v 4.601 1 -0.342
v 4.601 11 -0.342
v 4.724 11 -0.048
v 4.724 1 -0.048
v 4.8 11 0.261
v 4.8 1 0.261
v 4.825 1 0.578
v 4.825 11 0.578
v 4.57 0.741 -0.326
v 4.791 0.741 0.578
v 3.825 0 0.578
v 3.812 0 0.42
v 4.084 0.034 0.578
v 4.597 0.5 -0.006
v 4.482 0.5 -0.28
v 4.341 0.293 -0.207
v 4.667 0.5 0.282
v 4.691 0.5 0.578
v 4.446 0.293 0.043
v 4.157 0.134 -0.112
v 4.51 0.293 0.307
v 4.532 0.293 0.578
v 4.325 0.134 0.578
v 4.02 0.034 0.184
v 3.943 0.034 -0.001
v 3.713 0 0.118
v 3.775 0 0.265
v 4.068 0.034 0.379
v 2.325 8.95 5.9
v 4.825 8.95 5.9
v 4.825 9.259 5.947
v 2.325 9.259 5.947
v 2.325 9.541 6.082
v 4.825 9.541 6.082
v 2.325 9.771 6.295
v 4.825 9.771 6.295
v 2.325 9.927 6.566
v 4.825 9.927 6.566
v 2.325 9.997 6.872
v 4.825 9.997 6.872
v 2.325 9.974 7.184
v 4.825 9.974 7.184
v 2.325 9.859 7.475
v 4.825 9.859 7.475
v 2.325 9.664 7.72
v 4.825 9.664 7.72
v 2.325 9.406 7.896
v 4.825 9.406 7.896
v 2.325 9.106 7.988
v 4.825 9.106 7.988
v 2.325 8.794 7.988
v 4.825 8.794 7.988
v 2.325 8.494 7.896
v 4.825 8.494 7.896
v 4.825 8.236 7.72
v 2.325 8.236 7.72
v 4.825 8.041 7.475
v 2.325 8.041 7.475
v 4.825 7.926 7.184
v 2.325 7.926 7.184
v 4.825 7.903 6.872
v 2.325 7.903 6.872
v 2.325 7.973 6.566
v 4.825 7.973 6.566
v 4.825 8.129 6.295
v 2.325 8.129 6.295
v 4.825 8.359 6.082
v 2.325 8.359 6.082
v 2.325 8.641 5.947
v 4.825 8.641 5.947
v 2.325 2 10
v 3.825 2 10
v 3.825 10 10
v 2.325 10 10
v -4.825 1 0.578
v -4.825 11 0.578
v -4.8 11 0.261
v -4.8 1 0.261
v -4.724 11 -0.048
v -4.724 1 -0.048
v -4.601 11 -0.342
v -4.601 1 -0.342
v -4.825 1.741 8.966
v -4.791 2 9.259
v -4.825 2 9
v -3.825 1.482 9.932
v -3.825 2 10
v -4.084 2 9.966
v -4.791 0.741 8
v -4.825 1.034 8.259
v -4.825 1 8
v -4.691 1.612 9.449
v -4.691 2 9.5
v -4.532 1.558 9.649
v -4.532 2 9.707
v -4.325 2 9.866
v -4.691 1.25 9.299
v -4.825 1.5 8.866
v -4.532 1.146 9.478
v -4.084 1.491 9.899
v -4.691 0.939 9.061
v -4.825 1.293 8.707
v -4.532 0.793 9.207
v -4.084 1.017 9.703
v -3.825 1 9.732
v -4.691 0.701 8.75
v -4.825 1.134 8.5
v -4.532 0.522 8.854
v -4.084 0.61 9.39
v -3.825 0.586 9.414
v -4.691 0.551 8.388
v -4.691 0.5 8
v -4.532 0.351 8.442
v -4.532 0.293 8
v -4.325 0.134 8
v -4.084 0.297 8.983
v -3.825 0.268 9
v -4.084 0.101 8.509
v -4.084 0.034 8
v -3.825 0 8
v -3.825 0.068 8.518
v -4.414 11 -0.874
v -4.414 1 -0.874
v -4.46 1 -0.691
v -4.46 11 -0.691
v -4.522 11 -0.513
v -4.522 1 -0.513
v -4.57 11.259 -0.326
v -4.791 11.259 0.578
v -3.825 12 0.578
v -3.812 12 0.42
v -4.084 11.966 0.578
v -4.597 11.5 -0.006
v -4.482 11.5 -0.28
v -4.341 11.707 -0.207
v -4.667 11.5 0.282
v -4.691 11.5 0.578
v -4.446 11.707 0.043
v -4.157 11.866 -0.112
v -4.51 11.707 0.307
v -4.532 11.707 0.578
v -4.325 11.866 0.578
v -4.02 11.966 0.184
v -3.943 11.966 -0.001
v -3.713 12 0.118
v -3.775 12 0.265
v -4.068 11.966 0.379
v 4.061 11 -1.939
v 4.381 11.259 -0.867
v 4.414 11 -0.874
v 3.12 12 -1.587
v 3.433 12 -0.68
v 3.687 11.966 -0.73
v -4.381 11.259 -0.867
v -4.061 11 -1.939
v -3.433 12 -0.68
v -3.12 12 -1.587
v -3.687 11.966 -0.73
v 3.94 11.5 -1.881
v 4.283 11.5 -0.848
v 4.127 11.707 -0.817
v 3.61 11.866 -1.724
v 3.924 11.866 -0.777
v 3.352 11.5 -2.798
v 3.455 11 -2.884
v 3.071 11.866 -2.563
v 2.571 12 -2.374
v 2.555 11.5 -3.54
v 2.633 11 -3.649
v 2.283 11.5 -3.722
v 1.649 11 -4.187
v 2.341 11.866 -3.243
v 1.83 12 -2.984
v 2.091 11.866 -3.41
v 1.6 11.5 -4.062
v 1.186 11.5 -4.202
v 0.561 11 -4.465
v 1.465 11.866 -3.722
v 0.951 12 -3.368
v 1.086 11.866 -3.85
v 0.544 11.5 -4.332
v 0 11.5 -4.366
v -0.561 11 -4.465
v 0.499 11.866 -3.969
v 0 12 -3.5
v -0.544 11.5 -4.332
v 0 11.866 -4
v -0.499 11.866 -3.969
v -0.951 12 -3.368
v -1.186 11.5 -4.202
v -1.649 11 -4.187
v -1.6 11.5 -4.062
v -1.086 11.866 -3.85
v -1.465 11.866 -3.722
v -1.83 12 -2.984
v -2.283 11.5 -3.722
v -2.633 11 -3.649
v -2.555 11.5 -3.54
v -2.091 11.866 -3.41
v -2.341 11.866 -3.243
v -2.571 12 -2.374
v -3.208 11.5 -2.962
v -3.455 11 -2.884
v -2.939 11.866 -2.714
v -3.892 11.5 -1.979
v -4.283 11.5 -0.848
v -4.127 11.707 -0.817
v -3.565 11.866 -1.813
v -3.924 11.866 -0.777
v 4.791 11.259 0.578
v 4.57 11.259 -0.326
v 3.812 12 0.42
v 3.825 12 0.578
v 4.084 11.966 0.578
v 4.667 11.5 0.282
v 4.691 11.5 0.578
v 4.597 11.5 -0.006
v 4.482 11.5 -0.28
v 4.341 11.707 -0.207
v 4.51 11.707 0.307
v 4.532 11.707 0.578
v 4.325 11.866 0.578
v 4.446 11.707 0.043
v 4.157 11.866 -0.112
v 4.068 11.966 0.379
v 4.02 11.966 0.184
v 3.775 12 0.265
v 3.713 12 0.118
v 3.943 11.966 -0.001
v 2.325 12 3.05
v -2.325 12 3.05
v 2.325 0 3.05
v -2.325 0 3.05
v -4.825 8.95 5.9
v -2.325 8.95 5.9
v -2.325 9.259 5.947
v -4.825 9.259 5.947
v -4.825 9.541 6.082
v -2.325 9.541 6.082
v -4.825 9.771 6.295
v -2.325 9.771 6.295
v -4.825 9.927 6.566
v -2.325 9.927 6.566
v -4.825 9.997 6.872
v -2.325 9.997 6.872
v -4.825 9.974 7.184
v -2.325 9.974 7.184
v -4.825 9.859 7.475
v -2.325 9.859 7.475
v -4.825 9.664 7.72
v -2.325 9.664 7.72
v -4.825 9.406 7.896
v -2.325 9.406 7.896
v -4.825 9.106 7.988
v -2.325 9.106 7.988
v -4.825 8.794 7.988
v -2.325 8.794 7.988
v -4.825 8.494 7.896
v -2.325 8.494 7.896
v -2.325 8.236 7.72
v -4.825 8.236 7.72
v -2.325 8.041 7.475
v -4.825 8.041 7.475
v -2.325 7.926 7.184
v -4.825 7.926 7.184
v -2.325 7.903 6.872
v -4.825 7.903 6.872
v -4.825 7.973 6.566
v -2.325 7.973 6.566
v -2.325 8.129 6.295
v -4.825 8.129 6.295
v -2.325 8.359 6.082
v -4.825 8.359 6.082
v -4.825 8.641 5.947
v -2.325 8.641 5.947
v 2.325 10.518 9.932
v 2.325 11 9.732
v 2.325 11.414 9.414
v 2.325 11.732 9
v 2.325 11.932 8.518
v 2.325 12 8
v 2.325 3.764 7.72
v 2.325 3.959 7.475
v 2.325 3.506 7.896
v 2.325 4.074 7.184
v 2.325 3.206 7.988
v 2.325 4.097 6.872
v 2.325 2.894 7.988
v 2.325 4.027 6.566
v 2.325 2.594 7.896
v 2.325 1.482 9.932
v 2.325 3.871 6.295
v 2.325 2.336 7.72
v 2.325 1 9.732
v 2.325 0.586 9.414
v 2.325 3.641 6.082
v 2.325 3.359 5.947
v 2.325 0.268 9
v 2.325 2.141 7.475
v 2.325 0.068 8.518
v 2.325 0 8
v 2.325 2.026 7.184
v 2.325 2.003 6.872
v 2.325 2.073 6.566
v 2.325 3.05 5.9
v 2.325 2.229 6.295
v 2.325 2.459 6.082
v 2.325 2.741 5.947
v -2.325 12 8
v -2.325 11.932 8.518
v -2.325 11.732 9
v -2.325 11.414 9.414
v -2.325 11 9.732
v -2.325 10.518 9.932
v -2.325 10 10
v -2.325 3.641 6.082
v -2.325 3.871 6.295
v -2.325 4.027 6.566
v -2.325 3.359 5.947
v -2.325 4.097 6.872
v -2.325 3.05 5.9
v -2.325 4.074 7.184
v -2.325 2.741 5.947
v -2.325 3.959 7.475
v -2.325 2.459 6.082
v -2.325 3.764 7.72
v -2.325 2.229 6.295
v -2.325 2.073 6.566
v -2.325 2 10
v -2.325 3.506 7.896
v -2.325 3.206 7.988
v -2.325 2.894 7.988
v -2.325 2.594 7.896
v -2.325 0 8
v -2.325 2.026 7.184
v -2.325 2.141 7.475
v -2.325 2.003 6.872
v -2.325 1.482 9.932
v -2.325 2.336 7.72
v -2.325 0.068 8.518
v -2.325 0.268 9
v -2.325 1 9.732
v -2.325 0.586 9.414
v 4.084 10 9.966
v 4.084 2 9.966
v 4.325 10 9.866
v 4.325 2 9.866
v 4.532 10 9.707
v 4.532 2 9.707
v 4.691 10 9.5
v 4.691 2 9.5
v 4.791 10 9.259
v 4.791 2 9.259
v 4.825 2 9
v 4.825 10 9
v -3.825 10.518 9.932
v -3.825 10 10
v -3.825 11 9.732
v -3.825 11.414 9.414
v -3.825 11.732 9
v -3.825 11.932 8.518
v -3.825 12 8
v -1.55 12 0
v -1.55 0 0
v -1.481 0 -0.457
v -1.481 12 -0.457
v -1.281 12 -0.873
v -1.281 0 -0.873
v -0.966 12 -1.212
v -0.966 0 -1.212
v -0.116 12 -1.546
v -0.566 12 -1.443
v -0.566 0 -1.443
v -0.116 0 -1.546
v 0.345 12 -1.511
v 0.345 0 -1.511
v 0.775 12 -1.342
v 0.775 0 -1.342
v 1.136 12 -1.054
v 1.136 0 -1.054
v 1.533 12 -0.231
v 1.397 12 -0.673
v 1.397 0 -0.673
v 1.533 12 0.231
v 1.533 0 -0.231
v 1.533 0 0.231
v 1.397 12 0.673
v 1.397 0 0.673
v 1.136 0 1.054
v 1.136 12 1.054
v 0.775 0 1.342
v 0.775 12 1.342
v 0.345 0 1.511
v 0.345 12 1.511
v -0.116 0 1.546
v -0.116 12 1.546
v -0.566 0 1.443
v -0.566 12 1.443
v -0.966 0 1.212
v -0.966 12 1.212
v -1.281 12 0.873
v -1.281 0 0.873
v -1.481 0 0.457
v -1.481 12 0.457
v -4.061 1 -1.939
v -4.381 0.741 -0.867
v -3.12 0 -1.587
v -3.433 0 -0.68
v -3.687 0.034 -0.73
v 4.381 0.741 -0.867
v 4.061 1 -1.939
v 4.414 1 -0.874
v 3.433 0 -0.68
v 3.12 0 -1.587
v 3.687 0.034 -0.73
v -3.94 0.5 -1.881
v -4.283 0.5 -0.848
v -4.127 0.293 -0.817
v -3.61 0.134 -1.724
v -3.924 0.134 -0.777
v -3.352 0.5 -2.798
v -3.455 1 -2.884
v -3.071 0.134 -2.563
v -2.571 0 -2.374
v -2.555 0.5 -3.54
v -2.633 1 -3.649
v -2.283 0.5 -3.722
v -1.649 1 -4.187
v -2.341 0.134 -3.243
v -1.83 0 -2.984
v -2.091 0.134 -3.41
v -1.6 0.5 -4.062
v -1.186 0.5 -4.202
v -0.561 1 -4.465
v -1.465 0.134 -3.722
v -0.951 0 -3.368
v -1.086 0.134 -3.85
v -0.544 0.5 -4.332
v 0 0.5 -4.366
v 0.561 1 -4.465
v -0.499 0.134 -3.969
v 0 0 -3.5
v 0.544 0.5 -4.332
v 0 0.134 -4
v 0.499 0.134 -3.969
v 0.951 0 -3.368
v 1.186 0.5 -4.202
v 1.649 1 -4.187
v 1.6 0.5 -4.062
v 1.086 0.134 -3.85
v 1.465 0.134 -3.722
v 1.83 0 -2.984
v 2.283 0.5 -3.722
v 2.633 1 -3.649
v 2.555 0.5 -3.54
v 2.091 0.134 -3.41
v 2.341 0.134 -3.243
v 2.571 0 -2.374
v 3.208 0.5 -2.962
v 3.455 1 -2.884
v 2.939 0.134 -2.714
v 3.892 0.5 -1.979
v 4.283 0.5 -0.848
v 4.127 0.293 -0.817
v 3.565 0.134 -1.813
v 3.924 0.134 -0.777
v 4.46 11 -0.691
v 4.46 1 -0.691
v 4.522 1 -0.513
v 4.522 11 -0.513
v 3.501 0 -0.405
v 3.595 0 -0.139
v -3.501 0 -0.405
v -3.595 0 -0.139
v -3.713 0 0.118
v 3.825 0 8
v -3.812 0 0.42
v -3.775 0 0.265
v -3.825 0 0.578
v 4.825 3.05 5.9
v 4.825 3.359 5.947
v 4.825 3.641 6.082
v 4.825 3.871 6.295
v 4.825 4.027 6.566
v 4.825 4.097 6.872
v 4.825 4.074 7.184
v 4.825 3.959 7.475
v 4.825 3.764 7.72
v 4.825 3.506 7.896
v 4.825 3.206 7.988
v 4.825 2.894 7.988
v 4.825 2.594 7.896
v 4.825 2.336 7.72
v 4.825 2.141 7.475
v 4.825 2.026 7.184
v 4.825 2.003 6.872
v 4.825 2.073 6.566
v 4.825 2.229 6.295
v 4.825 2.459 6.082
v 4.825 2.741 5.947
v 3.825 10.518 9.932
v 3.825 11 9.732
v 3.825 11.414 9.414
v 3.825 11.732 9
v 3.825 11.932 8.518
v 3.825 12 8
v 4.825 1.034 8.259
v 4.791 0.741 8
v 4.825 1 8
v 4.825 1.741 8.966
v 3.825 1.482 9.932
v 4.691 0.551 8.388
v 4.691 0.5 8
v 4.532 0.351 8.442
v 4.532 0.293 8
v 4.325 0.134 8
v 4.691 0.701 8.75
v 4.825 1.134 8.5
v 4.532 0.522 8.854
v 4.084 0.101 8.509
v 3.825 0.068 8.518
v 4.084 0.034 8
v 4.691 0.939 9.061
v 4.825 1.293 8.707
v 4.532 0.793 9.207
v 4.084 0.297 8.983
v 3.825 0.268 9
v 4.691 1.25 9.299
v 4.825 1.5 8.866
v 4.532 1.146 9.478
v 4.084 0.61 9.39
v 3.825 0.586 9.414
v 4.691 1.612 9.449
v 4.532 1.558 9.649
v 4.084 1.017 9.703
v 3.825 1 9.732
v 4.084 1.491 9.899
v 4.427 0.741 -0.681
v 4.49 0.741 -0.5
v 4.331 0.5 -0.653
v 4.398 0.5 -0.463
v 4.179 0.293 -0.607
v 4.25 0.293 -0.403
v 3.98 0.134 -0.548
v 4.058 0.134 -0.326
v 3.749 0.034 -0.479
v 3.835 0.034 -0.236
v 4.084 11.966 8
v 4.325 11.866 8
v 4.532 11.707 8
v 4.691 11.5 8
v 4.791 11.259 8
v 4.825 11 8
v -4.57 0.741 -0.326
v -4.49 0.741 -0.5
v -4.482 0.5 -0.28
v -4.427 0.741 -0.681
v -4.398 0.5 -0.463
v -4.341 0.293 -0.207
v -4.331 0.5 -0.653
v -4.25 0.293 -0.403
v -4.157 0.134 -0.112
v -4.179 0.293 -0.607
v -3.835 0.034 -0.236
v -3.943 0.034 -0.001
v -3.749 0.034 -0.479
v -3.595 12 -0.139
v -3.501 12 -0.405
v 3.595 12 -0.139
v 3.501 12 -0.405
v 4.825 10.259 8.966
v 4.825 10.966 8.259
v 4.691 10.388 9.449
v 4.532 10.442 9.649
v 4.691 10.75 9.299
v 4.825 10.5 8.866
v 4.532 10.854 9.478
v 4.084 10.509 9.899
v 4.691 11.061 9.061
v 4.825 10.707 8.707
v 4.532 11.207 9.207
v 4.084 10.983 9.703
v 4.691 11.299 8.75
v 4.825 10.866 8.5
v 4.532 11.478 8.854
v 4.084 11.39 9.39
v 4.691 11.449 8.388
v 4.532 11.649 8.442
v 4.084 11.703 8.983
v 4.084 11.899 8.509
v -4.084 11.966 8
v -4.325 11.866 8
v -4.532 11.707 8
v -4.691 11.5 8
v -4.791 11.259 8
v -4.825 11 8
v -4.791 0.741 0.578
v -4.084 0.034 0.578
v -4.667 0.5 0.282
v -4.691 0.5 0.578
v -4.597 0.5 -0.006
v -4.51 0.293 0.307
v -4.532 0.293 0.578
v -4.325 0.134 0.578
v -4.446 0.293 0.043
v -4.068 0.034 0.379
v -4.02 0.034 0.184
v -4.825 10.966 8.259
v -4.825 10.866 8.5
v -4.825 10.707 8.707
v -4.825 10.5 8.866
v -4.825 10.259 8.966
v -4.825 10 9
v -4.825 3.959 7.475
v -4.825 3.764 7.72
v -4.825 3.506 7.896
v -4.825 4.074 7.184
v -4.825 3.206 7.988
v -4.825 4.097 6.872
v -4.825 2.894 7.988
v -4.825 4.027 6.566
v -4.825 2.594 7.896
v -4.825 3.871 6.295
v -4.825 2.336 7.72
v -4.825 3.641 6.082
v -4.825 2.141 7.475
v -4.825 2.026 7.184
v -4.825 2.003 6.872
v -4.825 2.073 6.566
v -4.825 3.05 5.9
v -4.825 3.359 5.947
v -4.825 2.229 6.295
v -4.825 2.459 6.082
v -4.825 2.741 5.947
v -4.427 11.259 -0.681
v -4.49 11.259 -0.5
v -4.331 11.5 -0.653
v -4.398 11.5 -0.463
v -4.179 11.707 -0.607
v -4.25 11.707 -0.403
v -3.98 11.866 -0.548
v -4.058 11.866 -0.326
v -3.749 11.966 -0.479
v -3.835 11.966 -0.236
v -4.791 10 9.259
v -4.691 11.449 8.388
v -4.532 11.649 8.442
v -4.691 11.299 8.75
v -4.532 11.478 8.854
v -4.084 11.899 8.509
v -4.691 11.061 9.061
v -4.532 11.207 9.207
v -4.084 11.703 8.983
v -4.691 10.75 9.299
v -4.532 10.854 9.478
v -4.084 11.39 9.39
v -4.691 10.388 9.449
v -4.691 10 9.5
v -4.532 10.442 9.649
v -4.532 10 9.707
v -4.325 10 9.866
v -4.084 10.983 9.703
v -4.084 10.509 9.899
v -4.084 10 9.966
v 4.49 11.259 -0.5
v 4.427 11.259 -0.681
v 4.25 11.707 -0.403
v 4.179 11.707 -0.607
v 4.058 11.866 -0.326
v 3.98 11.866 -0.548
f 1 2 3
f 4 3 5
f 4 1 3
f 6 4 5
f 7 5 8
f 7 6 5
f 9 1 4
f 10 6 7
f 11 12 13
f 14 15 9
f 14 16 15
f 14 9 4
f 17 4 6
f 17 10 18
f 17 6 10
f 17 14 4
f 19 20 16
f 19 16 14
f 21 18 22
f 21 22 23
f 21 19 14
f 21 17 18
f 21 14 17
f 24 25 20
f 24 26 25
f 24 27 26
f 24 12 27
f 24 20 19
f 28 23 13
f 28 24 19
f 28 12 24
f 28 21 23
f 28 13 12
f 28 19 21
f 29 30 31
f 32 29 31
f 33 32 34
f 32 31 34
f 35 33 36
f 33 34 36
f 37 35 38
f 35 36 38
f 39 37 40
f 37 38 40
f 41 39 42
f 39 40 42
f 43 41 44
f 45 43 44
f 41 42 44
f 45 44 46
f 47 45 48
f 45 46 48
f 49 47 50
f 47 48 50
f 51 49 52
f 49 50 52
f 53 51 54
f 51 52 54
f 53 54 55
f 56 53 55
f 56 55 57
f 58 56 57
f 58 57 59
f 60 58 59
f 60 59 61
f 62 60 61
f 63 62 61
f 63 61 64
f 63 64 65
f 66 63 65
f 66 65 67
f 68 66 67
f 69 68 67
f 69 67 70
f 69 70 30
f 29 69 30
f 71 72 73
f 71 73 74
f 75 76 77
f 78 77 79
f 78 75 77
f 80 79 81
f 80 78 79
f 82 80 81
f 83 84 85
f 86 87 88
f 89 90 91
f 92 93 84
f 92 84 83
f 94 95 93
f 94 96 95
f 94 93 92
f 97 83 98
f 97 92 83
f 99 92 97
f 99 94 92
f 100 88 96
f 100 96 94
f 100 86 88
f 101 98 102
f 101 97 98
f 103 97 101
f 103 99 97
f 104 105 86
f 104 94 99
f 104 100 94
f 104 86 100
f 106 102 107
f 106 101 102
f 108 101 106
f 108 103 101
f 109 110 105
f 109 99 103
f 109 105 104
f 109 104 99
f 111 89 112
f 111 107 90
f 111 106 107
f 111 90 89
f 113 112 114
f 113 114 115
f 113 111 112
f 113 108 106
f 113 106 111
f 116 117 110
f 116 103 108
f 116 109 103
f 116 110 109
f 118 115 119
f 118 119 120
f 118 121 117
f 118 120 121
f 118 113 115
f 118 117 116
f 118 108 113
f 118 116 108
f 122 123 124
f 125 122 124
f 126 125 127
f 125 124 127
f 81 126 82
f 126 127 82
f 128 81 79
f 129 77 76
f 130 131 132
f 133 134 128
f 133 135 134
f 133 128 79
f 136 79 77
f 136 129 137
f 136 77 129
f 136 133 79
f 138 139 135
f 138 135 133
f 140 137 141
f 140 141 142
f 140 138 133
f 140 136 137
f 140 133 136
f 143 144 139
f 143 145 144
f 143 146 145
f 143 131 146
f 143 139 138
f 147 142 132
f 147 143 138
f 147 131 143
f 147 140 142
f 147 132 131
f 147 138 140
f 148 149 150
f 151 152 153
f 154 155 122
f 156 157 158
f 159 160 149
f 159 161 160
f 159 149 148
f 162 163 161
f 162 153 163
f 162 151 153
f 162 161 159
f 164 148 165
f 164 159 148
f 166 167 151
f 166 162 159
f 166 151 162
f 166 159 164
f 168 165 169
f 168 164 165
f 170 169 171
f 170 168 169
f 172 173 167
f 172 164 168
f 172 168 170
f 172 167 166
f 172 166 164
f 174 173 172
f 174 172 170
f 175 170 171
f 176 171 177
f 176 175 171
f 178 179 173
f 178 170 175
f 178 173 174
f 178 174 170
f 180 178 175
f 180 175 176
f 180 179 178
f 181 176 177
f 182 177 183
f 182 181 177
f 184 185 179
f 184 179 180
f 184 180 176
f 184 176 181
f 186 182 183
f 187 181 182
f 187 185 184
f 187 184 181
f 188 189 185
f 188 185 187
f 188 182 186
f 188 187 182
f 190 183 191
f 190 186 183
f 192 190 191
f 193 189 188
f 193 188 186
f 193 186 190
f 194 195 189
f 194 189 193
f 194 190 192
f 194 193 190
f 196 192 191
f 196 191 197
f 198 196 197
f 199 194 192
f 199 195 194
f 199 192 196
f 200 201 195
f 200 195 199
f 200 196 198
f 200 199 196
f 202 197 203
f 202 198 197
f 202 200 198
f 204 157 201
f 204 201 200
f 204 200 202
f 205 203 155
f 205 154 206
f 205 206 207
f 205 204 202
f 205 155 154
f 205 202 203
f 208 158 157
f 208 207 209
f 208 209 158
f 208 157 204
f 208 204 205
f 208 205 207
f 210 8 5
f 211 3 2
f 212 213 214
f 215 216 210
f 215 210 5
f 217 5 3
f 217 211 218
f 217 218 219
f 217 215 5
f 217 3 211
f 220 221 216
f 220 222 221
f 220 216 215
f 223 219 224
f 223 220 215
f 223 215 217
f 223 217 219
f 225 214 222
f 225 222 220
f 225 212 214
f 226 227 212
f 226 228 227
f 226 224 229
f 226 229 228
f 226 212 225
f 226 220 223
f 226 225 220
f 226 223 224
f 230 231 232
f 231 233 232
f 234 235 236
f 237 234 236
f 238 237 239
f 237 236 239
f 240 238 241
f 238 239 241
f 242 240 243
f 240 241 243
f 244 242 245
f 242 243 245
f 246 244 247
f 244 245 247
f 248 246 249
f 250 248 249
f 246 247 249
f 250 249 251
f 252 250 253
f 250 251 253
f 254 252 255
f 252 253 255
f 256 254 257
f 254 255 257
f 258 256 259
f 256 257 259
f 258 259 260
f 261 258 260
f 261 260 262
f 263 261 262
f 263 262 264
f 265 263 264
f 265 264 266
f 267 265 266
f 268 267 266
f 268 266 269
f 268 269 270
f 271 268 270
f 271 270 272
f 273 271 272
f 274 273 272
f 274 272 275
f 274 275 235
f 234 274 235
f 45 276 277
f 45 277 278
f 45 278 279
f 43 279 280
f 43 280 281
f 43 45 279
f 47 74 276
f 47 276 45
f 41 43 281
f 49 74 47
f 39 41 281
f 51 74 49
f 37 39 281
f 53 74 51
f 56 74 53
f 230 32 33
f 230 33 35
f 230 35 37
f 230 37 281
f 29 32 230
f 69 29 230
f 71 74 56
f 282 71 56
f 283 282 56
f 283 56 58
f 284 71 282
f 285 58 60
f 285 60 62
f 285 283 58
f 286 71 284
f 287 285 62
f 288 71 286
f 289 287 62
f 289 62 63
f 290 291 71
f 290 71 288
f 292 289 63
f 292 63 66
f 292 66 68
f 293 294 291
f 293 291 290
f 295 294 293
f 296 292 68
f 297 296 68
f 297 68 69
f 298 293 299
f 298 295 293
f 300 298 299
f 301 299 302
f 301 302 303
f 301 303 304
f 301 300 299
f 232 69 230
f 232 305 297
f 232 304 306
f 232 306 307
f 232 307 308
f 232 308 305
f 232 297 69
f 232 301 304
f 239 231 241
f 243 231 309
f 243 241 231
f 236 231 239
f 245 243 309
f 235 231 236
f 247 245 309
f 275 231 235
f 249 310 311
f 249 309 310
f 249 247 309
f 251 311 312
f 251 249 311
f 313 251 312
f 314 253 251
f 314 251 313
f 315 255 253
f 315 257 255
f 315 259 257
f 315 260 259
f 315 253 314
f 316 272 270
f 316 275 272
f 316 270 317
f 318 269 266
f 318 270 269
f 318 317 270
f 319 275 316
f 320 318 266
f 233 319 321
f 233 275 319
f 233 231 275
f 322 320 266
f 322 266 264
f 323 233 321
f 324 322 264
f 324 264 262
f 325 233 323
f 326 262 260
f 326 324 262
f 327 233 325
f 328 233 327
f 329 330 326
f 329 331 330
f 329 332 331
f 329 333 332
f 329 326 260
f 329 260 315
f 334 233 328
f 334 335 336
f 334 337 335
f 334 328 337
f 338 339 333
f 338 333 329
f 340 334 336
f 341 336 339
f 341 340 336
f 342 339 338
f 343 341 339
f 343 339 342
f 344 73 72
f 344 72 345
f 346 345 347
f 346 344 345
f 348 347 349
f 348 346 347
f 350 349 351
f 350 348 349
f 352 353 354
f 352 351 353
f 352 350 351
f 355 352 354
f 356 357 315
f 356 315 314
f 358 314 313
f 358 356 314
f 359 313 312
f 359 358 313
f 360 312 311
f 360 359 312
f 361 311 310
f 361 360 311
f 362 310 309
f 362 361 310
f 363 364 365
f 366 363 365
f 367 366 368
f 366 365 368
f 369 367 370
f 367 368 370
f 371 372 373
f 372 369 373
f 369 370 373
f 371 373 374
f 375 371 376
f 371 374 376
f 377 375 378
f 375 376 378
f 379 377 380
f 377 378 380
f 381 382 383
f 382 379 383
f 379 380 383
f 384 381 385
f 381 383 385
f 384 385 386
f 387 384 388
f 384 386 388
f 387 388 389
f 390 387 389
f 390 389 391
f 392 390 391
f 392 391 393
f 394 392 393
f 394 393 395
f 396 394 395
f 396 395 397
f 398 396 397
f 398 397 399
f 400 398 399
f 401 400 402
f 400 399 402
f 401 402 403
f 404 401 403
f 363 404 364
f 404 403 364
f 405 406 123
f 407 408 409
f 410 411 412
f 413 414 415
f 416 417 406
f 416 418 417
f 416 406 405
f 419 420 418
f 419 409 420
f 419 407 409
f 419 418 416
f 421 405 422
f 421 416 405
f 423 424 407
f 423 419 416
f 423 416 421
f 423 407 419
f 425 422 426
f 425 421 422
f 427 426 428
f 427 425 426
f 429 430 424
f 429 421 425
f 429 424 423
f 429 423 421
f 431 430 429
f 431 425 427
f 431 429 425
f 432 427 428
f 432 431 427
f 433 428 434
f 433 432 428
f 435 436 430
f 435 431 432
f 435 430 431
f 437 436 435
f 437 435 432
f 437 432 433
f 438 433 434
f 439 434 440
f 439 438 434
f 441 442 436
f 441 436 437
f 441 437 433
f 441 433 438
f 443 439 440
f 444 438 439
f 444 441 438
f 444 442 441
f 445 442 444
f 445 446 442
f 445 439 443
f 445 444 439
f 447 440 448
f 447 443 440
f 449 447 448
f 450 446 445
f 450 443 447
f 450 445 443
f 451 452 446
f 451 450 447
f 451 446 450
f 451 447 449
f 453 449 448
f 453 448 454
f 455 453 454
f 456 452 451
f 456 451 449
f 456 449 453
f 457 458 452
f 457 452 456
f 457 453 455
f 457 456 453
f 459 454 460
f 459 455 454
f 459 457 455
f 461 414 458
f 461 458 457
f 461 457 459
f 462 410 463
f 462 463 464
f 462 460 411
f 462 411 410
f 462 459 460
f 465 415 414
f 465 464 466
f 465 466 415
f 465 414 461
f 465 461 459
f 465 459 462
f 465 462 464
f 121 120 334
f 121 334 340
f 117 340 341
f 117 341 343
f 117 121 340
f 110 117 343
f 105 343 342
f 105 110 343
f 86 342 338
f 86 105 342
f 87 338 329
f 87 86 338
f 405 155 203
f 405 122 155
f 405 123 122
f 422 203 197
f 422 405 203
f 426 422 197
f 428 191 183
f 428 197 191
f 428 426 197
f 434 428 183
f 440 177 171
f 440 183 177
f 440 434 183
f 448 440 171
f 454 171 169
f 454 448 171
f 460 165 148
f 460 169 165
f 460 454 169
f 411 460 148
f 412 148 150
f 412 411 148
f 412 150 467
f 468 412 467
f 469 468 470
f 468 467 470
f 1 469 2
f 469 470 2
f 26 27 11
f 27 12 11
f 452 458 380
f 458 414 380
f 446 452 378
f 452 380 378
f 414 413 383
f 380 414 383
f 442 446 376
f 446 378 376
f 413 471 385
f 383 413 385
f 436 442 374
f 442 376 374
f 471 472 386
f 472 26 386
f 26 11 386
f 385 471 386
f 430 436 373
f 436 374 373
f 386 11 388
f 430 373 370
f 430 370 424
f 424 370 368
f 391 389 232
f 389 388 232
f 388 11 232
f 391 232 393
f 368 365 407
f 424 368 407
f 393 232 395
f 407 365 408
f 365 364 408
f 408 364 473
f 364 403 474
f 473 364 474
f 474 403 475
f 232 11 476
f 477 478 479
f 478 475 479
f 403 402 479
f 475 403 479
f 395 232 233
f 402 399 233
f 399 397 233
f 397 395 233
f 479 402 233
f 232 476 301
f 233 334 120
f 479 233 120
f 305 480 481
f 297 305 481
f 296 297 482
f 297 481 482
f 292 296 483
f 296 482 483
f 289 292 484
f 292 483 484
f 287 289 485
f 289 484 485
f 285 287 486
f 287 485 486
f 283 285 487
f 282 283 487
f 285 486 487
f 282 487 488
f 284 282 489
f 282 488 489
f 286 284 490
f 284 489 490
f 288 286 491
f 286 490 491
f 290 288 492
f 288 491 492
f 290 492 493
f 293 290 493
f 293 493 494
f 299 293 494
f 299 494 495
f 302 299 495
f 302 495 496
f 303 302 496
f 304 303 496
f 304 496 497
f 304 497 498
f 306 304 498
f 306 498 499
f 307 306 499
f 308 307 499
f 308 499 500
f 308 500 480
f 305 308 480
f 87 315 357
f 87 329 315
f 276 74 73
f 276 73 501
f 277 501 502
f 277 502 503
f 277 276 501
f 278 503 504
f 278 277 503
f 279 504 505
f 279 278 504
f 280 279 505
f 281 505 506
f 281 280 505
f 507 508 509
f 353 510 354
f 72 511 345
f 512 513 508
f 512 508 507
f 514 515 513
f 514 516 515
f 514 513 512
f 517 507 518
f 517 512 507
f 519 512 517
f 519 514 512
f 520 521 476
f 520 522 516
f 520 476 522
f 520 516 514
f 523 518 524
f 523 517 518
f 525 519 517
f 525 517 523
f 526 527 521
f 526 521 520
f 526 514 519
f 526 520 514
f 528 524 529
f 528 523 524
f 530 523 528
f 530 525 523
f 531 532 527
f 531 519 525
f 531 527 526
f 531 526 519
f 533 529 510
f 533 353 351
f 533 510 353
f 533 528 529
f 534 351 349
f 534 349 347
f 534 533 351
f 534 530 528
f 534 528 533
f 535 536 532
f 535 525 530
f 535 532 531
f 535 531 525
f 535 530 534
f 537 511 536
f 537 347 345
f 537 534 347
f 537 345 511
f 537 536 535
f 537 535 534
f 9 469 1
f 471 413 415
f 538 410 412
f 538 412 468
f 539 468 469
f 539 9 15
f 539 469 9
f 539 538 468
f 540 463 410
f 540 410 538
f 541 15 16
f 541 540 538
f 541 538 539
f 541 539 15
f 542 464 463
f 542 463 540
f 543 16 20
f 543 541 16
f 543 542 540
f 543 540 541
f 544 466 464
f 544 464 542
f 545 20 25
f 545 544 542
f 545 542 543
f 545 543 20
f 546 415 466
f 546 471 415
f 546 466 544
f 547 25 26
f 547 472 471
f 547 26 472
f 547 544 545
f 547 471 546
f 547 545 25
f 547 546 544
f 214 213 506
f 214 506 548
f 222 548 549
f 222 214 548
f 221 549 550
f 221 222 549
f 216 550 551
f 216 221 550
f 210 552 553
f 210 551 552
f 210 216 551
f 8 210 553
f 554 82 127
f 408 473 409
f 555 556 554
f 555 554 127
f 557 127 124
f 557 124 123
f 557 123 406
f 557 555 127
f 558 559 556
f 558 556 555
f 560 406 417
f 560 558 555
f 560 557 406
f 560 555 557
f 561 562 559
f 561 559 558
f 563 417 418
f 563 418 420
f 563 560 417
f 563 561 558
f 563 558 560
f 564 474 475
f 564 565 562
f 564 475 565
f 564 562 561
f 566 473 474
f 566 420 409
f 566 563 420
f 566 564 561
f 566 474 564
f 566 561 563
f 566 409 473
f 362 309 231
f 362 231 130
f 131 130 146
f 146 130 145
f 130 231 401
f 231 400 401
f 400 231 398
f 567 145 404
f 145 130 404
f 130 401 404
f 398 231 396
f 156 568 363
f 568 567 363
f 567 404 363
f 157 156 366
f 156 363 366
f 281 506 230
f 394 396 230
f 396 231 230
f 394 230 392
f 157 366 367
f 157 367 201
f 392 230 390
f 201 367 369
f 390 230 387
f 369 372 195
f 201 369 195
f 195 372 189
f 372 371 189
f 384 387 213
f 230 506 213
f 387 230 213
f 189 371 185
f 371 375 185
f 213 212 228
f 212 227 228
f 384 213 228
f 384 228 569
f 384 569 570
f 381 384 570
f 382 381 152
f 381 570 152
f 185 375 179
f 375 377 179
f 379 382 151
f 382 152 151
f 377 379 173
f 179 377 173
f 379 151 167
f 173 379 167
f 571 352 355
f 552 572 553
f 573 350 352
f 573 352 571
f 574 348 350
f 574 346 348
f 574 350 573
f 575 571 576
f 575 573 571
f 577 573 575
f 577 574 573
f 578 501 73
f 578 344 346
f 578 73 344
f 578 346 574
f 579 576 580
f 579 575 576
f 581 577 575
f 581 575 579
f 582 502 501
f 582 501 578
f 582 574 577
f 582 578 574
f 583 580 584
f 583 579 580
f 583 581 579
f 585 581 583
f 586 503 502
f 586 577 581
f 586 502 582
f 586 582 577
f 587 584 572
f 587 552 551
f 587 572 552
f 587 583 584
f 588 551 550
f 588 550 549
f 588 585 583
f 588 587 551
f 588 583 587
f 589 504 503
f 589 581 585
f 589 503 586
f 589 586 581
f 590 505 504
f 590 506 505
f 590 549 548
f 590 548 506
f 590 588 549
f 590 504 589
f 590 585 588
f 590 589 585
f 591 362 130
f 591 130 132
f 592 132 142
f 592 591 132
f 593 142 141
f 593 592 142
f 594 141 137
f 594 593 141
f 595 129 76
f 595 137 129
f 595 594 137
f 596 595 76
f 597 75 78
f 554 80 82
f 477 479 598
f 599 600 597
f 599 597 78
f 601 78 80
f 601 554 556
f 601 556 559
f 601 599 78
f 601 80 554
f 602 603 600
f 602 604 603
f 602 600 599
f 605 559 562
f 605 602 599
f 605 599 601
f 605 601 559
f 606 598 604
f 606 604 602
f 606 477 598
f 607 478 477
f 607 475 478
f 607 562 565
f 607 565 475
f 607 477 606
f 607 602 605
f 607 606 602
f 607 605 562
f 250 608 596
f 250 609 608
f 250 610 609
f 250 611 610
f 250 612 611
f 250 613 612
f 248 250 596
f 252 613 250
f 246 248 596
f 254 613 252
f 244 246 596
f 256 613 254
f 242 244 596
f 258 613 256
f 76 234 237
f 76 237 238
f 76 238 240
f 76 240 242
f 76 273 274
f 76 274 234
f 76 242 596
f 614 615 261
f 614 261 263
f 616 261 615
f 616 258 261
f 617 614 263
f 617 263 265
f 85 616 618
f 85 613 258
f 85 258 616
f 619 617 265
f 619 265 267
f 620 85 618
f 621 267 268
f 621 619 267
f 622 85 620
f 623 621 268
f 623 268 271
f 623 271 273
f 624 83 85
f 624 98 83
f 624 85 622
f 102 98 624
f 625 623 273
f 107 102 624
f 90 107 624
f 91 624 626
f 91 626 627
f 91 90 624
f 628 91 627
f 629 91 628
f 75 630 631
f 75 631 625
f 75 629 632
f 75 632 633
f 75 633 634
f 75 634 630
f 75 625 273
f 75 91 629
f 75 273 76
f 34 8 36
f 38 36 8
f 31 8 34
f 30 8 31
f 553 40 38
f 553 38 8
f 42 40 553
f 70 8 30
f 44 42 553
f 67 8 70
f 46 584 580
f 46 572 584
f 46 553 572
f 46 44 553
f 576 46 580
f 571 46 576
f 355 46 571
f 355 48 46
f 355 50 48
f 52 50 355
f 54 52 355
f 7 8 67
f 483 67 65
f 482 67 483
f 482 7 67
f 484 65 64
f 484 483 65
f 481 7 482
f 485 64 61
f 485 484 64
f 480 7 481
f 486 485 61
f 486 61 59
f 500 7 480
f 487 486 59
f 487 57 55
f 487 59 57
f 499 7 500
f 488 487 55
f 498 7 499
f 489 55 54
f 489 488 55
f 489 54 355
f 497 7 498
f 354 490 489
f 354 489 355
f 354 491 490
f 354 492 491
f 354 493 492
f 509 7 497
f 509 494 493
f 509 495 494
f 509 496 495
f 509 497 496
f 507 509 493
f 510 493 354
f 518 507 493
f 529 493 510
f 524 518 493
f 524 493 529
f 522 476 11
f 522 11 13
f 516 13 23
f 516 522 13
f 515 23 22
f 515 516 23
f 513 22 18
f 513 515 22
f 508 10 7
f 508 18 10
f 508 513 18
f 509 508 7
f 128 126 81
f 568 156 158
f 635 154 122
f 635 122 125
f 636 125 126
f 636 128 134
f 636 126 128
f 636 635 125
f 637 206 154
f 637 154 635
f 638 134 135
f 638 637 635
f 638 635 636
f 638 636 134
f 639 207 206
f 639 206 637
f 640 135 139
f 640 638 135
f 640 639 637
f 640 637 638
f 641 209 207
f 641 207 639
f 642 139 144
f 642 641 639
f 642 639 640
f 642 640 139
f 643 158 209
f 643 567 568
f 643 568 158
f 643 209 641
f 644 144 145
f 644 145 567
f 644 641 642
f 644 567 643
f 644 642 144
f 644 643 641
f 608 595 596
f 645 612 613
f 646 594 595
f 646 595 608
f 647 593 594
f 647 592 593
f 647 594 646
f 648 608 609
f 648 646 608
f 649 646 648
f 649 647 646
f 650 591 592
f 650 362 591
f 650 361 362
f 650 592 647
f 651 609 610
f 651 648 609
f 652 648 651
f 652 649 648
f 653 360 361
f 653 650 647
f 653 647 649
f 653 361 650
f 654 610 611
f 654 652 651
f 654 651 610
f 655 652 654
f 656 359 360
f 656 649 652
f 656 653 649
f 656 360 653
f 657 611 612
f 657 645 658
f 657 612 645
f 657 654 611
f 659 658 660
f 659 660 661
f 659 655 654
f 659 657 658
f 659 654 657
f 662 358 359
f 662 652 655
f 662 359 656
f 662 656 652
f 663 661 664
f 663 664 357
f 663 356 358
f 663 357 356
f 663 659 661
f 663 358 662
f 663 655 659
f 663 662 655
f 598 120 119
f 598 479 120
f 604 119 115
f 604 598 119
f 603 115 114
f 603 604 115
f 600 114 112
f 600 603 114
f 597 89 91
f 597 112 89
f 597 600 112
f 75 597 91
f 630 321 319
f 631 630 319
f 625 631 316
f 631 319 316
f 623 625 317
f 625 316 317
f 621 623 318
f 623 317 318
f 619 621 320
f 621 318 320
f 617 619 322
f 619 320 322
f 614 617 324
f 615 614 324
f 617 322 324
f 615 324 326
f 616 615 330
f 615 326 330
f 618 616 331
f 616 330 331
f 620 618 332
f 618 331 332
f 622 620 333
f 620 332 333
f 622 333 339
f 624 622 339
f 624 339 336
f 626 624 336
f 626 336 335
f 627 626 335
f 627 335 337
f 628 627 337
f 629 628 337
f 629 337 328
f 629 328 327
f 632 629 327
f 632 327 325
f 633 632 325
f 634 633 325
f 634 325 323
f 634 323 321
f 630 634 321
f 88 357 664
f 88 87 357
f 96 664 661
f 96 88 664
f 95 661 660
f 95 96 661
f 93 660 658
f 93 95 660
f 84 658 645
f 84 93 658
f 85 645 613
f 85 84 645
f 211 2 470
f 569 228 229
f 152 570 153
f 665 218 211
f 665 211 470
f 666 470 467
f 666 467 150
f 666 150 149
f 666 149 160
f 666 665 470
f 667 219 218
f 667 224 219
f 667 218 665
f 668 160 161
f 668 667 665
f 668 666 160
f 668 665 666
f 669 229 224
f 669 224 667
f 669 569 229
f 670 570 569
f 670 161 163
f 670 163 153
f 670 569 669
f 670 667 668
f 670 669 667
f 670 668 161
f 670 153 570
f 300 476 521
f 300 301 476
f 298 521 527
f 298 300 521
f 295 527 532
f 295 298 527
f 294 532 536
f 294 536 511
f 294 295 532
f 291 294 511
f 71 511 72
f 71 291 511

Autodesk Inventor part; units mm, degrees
ref_plane "YZ Plane" through (0, 0, 0) normal (1, 0, 0) x (0, 1, 0)
ref_plane "XZ Plane" through (0, 0, 0) normal (0, 1, 0) x (-1, 0, 0)
ref_plane "XY Plane" through (0, 0, 0) normal (0, 0, 1) x (1, 0, 0)
sketch "Sketch1" plane through (0, 0, 0) normal (0, 1, 0) x (-1, 0, 0)
  circle A0 centre (0, 0) radius 1.55
  circle A1 centre (0, 0) radius 4.5
  dimension "d0" = 3.1
  dimension "d1" = 9
extrude "Extrusion1" add sketch "Sketch1" along normal blind 12
sketch "Sketch2" plane through (0, 0, 0) normal (0, 1, 0) x (-1, 0, 0)
  line L0 (4.825, 0) -> (-4.825, 0)
  line L1 (-4.825, 0) -> (-4.825, 10)
  line L2 (-4.825, 10) -> (4.825, 10)
  line L3 (4.825, 10) -> (4.825, 0)
  line L4 (2.325, 0) -> (2.325, 10)
  line L5 (-2.325, 10) -> (-2.325, 0)
  circle A0 centre (0, 0) radius 4.5 projected
  circle A1 centre (0, 0) radius 4.5 projected
  line L6 (2.325, 3.05) -> (-2.325, 3.05)
  circle A2 centre (0, 0) radius 1.55 projected
  point P0 (-2.325, 3.8528)
  point P1 (2.325, 3.8528)
  point P2 (-4.5, 0)
  point P3 (4.5, 0)
  dimension "d4" = 4.65
  dimension "d5" = 2.325
  dimension "d6" = 2.5
  dimension "d7" = 2.5
  dimension "d8" = 10
  dimension "d25" = 1.5
extrude "Extrusion2" add sketch "Sketch2" along normal blind 12 contours L0 A0 L4 L2 L3 | L0 L4 A0 | A0 L5 L0 | L0 L1 L2 L5 A0
extrude "Extrusion4" cut sketch "Sketch2" along normal blind 20 contours L4 L6 L5 A0 | A2 L0 | L0 A2
sketch "Sketch3" plane through (4.825, 0, 10) normal (1, 0, 0) x (0, 0, -1)
  circle A0 centre (3.05, 3.05) radius 1.05
  circle A1 centre (3.05, 8.95) radius 1.05
  line L0 (0, 0) -> (0, 12) projected
  line L1 (0, 12) -> (10, 12) projected
  line L2 (0, 0) -> (10, 0) projected
  dimension "d11" = 2.1
  dimension "d12" = 2.1
  dimension "d13" = 2
  dimension "d14" = 2
  dimension "d26" = 5.9
  dimension "d27" = 3.05
extrude "Extrusion3" cut sketch "Sketch3" against normal blind 11
fillet "Fillet2" radius 2 4 edges at (4.5, 6, 0) (-4.5, 6, 0) (-4.825, 6, 0) (4.825, 6, 0)
fillet "Fillet3" radius 2 4 edges at (-3.575, 12, 10) (-3.575, 0, 10) (3.575, 0, 10) (3.575, 12, 10)
fillet "Fillet4" radius 1 16 edges at (0, 12, -4.5) (4.4886, 12, -0.6014) (-4.4886, 12, -0.6014) (-4.825, 12, 4.2892) (-4.825, 11.4142, 9.4142) (-4.825, 6, 10) (-4.825, 0.5858, 9.4142) (-4.825, 0, 4.2892) (4.4886, 0, -0.6014) (-4.4886, 0, -0.6014) (0, 0, -4.5) (4.825, 0, 4.2892) (4.825, 0.5858, 9.4142) (4.825, 6, 10) (4.825, 11.4142, 9.4142) (4.825, 12, 4.2892)
equation "\"d5\" = 0.5 * d4"
properties part number "Feather_clip_acrylic"
